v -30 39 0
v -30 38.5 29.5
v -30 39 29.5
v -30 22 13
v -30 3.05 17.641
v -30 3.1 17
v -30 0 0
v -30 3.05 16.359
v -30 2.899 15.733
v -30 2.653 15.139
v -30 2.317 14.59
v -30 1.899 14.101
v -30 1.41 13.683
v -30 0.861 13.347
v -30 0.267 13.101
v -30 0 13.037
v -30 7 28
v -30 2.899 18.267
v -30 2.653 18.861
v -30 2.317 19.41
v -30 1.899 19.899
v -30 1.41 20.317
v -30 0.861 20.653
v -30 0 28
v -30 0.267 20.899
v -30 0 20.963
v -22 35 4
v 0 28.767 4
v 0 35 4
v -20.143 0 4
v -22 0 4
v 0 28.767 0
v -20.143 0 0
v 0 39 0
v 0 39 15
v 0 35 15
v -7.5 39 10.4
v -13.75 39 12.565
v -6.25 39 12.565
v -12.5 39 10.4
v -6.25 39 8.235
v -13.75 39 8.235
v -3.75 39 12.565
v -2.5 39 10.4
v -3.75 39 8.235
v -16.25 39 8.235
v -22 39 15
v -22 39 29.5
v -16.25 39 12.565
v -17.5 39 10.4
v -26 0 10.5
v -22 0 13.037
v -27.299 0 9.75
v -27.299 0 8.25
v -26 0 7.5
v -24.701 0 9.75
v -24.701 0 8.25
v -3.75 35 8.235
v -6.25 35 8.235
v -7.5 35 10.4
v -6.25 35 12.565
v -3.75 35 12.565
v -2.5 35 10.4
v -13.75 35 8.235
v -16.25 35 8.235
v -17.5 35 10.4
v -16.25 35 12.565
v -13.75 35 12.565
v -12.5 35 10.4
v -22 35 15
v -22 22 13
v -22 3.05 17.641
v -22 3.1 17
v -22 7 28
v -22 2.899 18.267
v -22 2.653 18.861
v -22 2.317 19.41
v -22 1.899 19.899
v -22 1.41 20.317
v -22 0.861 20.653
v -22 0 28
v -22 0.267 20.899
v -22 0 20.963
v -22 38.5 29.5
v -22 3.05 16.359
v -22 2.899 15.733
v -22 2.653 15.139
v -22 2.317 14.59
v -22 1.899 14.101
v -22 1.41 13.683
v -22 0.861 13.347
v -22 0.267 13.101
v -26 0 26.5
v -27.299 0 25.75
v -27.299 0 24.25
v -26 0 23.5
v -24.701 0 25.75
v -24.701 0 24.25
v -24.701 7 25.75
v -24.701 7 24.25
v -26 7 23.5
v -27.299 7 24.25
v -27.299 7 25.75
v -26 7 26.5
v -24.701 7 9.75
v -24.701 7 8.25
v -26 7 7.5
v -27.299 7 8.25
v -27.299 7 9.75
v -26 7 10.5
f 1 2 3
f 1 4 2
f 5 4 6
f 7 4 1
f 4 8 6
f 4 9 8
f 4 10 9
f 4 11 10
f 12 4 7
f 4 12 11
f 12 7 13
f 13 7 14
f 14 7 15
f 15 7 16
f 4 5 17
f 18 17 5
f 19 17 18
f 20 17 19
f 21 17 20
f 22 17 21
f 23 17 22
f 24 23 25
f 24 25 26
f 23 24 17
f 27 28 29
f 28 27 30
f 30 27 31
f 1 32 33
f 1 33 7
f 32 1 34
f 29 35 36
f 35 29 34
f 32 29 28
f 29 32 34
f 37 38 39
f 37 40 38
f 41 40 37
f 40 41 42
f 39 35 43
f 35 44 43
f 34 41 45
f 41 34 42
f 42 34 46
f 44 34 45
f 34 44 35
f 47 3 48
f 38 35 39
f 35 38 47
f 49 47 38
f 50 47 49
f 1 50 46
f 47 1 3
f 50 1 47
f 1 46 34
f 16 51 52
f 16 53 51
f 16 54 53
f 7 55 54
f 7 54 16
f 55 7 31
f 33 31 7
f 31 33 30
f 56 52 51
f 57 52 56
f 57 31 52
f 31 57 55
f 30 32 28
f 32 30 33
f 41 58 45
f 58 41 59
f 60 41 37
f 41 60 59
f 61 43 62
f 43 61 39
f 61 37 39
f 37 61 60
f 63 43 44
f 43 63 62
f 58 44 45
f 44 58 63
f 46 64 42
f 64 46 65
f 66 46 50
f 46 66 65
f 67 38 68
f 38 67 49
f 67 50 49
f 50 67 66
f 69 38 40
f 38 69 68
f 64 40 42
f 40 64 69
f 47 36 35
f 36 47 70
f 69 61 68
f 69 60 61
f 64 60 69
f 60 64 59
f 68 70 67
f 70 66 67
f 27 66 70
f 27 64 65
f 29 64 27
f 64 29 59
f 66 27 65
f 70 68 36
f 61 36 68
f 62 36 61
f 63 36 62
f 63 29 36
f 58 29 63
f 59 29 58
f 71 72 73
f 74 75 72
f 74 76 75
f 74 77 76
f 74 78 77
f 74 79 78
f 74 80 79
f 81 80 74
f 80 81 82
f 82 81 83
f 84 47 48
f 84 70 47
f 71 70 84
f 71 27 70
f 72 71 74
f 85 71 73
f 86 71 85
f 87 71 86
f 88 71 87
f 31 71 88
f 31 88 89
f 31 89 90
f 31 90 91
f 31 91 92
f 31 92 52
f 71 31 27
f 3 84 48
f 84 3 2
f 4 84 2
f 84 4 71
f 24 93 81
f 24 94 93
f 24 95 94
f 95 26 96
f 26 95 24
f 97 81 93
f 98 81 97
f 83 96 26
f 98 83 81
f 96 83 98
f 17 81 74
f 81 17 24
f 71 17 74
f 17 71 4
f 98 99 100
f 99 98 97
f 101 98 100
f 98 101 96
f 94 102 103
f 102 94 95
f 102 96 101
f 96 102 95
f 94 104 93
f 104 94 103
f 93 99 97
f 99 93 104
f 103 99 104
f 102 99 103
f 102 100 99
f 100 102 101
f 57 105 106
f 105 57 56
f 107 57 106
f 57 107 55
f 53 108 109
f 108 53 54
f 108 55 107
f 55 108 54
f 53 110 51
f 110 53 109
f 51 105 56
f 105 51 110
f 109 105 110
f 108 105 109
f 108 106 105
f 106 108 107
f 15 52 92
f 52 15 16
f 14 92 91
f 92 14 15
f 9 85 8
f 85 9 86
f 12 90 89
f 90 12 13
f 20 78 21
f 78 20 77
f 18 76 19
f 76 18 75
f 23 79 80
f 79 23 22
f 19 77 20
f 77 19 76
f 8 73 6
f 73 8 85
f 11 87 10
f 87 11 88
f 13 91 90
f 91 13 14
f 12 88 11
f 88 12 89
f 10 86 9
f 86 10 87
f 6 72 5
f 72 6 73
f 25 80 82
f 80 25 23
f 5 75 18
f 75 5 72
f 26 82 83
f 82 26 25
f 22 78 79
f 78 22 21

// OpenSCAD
// file: ../libs/utils/build_plate.scad
// Minimal build plate helper for browser customizer builds.
module build_plate(build_plate_selector=0, build_plate_manual_x=100, build_plate_manual_y=100) {
  // intentionally no-op in browser preview
}
// file: ../libs/obiscad/attach.scad
//---------------------------------------------------------------
//-- Openscad Attachment library
//-- Attach parts easily. Make your designs more reusable and clean
//---------------------------------------------------------------
//-- This is a component of the obiscad opescad tools by Obijuan
//-- (C) Juan Gonzalez-Gomez (Obijuan)
//-- Sep-2012
//---------------------------------------------------------------
//-- Released under the GPL license
//---------------------------------------------------------------

use <vector.scad>

//--------------------------------------------------------------------
//-- Draw a connector
//-- A connector is defined a 3-tuple that consist of a point
//--- (the attachment point), and axis (the attachment axis) and
//--- an angle the connected part should be rotate around the 
//--  attachment axis
//--
//--- Input parameters:
//--
//--  Connector c = [p , n, ang] where:
//--
//--     p : The attachment point
//--     v : The attachment axis
//--   ang : the angle
//--------------------------------------------------------------------
module connector(c)
{
  //-- Get the three components from the connector
  p = c[0];
  v = c[1];
  ang = c[2];

  //-- Draw the attachment poing
  color("Gray") point(p);

  //-- Draw the attachment axis vector (with a mark)
  translate(p)
    rotate(a=ang, v=v)
    color("Gray") vector(unitv(v)*6, l_arrow=2, mark=true);
}


//-------------------------------------------------------------------------
//--  ATTACH OPERATOR
//--  This operator applies the necesary transformations to the 
//--  child (attachable part) so that it is attached to the main part
//--  
//--  Parameters
//--    a -> Connector of the main part
//--    b -> Connector of the attachable part
//-------------------------------------------------------------------------
module attach(a,b)
{
  //-- Get the data from the connectors
  pos1 = a[0];  //-- Attachment point. Main part
  v    = a[1];  //-- Attachment axis. Main part
  roll = a[2];  //-- Rolling angle
  
  pos2 = b[0];  //-- Attachment point. Attachable part
  vref = b[1];  //-- Atachment axis. Attachable part
                //-- The rolling angle of the attachable part is not used

  //-------- Calculations for the "orientate operator"------
  //-- Calculate the rotation axis
  raxis = cross(vref,v);
    
  //-- Calculate the angle between the vectors
  ang = anglev(vref,v);
  //--------------------------------------------------------.-

  //-- Apply the transformations to the child ---------------------------

  //-- Place the attachable part on the main part attachment point
  translate(pos1)
    //-- Orientate operator. Apply the orientation so that
    //-- both attachment axis are paralell. Also apply the roll angle
    rotate(a=roll, v=v)  rotate(a=ang, v=raxis)
      //-- Attachable part to the origin
      translate(-pos2)
	child(0); 
}


//--------------------------------------------------------------------
//---   An example of the attach operator
//---  
//---  There are two parts: the main body and an arm
//---  They both are cubes (for simplicity)
//---
//--   In the main body there are 2 connectors defined, so that
//--  the arm can be attached to any of them (or both if you like)
//------------------------------------------------------------------

//-- In the debug mode the connectors and additional information
//-- are shown
debug=true;

//-- Define the Main part: A cube
//-- Two attachment points are defined: one on the top, another in the
//--- left side
size = [10,10,10];

//-- Connectors defined:

//--     Att. point       Att. Axis  Roll
c1 = [ [0,0,size[2]/2],  [0,0,1],     20];  //-- Connector on the top
c2 = [ [-size[0]/2,0,0], [-1,0,0],    90];  //-- Connector on the left


//-- Draw the main part along with the connectors (for debugging)
cube(size,center=true);

//-- In debug mode: Draw the main part connectors!
if (debug) {
  connector(c1);
  connector(c2);
}

//-- Define the Attachable part. It is another cube, with one connector
asize = [5,20,3];
a = [ [0,asize[1]/2-3,-asize[2]/2], [0,0,1], 0  ];


//-- Do the attach!
//-- Just change c1 by c2 to attach the part to the other 
//-- connector. Super-easy!! :-)
//-- Modify the c1 and c2 roll angle for rotating the attachable
//--  part to the desired orientation
attach(c1,a)
  //-- This is the attachable part! 
  union() {
    cube(asize,center=true);  //-- The part

    //-- In debug mode show additional info:
    if (debug) {
      frame(l=10);    //-- The part frame of reference.
      connector(a);   //-- Show the part connector
    }
  };

  
// file: ../libs/build_plate.scad
//use this to include a build plate visualization in your openSCAD scripts. Very useful for things designed to be edited in Makerbot Customizer

//to use, either include or use <utils/build_plate.scad>

//then just call build_plate(); with the following arguments (also, you have to have a real object in your scene for this to render)

//putting 0 as the first argument will give you a Replicator 2 build plate
//putting 1 as the first argument will give you a Replicator 1 build plate
//putting 2 as the first argument will give you a Thingomatic build plate
//putting 3 as the first argument will give you a manually adjustable build plate (note: if you use this option, you need to specify your build plates X length (in mm) as the second argument and the Y length (in mm) as the third argument. eg. build_plate(3,150,120);)

/*

to give your user control of which build plate they see in Customizer, include the following code:

use <utils/build_plate.scad>

//for display only, doesn't contribute to final object
build_plate_selector = 0; //[0:Replicator 2,1: Replicator,2:Thingomatic,3:Manual]
//when Build Plate Selector is set to "manual" this controls the build plate x dimension
build_plate_manual_x = 100; //[100:400]
//when Build Plate Selector is set to "manual" this controls the build plate y dimension
build_plate_manual_y = 100; //[100:400]

build_plate(build_plate_selector,build_plate_manual_x,build_plate_manual_y);

*/




//to see how this works, uncomment the following code

//build_plate_selector = 0; //[0:Replicator 2,1: Replicator,2:Thingomatic,3:Manual]
//build_plate_manual_x = 100; //[100:400]
//build_plate_manual_y = 100; //[100:400]
//
//build_plate(build_plate_selector,build_plate_manual_x,build_plate_manual_y);
//
//cube(5);


module build_plate(bp,manX,manY){

		translate([0,0,-.52]){
			if(bp == 0){
				%cube([285,153,1],center = true);
			}
			if(bp == 1){
				%cube([225,145,1],center = true);
			}
			if(bp == 2){
				%cube([120,120,1],center = true);
			}
			if(bp == 3){
				%cube([manX,manY,1],center = true);
			}
		
		}
		translate([0,0,-.5]){
			if(bp == 0){
				for(i = [-14:14]){
					translate([i*10,0,0])
					%cube([.5,153,1.01],center = true);
				}
				for(i = [-7:7]){
					translate([0,i*10,0])
					%cube([285,.5,1.01],center = true);
				}	
			}
			if(bp == 1){
				for(i = [-11:11]){
					translate([i*10,0,0])
						%cube([.5,145,1.01],center = true);
				}
				for(i = [-7:7]){
					translate([0,i*10,0])
						%cube([225,.5,1.01],center = true);
				}
			}
			if(bp == 2){
				for(i = [-6:6]){
					translate([i*10,0,0])
						%cube([.5,120,1.01],center = true);
				}
				for(i = [-6:6]){
					translate([0,i*10,0])
						%cube([120,.5,1.01],center = true);
				}
			}
			if(bp == 3){
				for(i = [-(floor(manX/20)):floor(manX/20)]){
					translate([i*10,0,0])
						%cube([.5,manY,1.01],center = true);
				}
				for(i = [-(floor(manY/20)):floor(manY/20)]){
					translate([0,i*10,0])
						%cube([manX,.5,1.01],center = true);
				}
			}
		}
}
// file: ../libs/obiscad/bcube.scad
//------------------------------------------------------------------------------
//  Bevel edge cube.
//  (c) Juan Gonzalez-Gomez (Obijuan), Sep-2012
//------------------------------------------------------------------------------

//----------------- IMPLEMENTATION USING THE MINKOWSKI OPERATOR ----------------

//------------------------------------------------------------------------------
//-- Bevel Cube main function
//-- Parameters:
//--   * Size:  Cube size
//--   * cr : Corner radius (if cr==0, a standar cube is built)
//--   * cres:  Corner resolution (in points). cres=0 means flat corners
//------------------------------------------------------------------------------
module bcube(size,cr=0,cres=0)
{
  //-- Internal cube size
  bsize = size - 2*[cr,cr,0];

  //-- Get the (x,y) coorner coordinates in the 1st cuadrant
  x = bsize[0]/2;
  y = bsize[1]/2;

  //-- A corner radius of 0 means a standar cube!
  if (cr==0)
    cube(bsize,center=true);
  else {

      
      //-- The height of minkowski object is double. So
      //-- we sould scale by 0.5
      scale([1,1,0.5])

      //-- This translation is for centering the minkowski objet
      translate([-x, -y,0])

      //-- Built the  beveled cube with minkowski
      minkowski() {

        //-- Internal cube
        cube(bsize,center=true);

        //-- Cylinder in the corner (1st cuadrant)
        translate([x,y, 0])
          cylinder(r=cr, h=bsize[2],center=true, $fn=4*(cres+1));
      }
  }

}


//-- Examples of use of the bcube() module

//-- Standar cube
translate([-15,15,0])
bcube([20,20,10]);

//-- Beveled cube (0 point resolution)
translate([15,15,0])
  bcube([20,20,10],cr=4);

//-- Beveled cube (1 point resolution)
translate([-15,-15,0])
  bcube([20,20,10],cr=4, cres=1);

//-- Beveled cube (4 points resolution)
translate([15,-15,0])
  bcube([20,20,10],cr=4, cres=4);
// main file
// Cyclone PCB Factory: a 3D printable CNC machine for PCB manufacture
// Created by Carlosgs (http://carlosgs.es)
// License: Attribution - Share Alike - Creative Commons (http://creativecommons.org/licenses/by-sa/3.0/)

use <../libs/obiscad/bcube.scad>
use <../libs/obiscad/bevel.scad>
use <../libs/build_plate.scad>


module Y_rod_idler(show_printbed = 0) {

motor_stand_thickness = 5;

bearing_diameter = 22.4;
M8_rod_diam = 8.2;

smooth_rod_margin = 1;

smooth_rod_screw_sep = 8;
smooth_rod_screw_diam = 3;
smooth_rod_screw_len = 7;

frame_thickness = 4;
bottom_thickness = 4;
base_screw_diameter = 5;

Y_rod_height = 40;
Y_rod_dist_from_wall = 15;

Y_rod_support_lenght = Y_rod_dist_from_wall+smooth_rod_screw_sep+smooth_rod_screw_diam;

frame_width = 30;
frame_height = Y_rod_height-smooth_rod_margin;
wall_thickness = 5;

if(show_printbed) {
//for display only, doesn't contribute to final object
translate([frame_width/2,frame_height/2,0]) build_plate(3,110,140);
}

union() {
  // --------- Main frame --------- //  
  difference() {
  translate([frame_width/2,frame_height/2,frame_thickness/2])
    cube([frame_width,frame_height,frame_thickness],center=true);
  rotate([0,0,35]) cube([33,frame_height*10,frame_thickness*10],center=true);

  } // End of difference() command


// --------- Step with screws in the base --------- //  
difference() {
  translate([0,frame_height-bottom_thickness,frame_thickness/2])
    cube([frame_width,bottom_thickness,Y_rod_support_lenght/2],center=false);
  // --------- Screws in the base --------- //
  rotate([90,0,0]) translate([frame_width/3,Y_rod_support_lenght/2.5,-frame_height]) {
    translate([-5,0,0])
      cylinder(r=base_screw_diameter/2,h=2*smooth_rod_screw_len,center=true,$fn=6);
    translate([5,0,0])
      cylinder(r=base_screw_diameter/2,h=2*smooth_rod_screw_len,center=true,$fn=6);
  }

  } // End of difference() command


// --------- Bevel base supports --------- //
translate([frame_width-frame_thickness,frame_height,frame_thickness-0.5])
  rotate([90,0,-90])
    bconcave_corner(cr=Y_rod_support_lenght-0.5, cres=0, l=frame_thickness*2, th=0.5, ext_corner=true);


// --------- Bevel Y rod support --------- //
translate([frame_width-frame_thickness,frame_height,frame_thickness-2])
  translate([0,-Y_rod_height+smooth_rod_margin,0]) {
    difference() {
      rotate([90,0,90]) // Bevel
        bconcave_corner(cr=Y_rod_support_lenght-smooth_rod_screw_len, cres=0, l=frame_thickness*2, th=smooth_rod_screw_len, ext_corner=true);

      translate([0,-smooth_rod_margin,Y_rod_dist_from_wall]) rotate([0,90,0]) {
        cylinder(r=M8_rod_diam/2,h=10*frame_thickness,center=true,$fn=40);
        // Screws
        rotate([90,0,0]) {
          translate([-smooth_rod_screw_sep,0,-1])
            cylinder(r=smooth_rod_screw_diam/2,h=2*smooth_rod_screw_len,center=true,$fn=6);
          translate([smooth_rod_screw_sep,0,-1])
            cylinder(r=smooth_rod_screw_diam/2,h=2*smooth_rod_screw_len,center=true,$fn=6);
        }
      }
  }
  }

} // End of union() command

}


//Y_rod_idler(show_printbed = 1);
scale([-1,1,1]) Y_rod_idler(show_printbed = 1);
